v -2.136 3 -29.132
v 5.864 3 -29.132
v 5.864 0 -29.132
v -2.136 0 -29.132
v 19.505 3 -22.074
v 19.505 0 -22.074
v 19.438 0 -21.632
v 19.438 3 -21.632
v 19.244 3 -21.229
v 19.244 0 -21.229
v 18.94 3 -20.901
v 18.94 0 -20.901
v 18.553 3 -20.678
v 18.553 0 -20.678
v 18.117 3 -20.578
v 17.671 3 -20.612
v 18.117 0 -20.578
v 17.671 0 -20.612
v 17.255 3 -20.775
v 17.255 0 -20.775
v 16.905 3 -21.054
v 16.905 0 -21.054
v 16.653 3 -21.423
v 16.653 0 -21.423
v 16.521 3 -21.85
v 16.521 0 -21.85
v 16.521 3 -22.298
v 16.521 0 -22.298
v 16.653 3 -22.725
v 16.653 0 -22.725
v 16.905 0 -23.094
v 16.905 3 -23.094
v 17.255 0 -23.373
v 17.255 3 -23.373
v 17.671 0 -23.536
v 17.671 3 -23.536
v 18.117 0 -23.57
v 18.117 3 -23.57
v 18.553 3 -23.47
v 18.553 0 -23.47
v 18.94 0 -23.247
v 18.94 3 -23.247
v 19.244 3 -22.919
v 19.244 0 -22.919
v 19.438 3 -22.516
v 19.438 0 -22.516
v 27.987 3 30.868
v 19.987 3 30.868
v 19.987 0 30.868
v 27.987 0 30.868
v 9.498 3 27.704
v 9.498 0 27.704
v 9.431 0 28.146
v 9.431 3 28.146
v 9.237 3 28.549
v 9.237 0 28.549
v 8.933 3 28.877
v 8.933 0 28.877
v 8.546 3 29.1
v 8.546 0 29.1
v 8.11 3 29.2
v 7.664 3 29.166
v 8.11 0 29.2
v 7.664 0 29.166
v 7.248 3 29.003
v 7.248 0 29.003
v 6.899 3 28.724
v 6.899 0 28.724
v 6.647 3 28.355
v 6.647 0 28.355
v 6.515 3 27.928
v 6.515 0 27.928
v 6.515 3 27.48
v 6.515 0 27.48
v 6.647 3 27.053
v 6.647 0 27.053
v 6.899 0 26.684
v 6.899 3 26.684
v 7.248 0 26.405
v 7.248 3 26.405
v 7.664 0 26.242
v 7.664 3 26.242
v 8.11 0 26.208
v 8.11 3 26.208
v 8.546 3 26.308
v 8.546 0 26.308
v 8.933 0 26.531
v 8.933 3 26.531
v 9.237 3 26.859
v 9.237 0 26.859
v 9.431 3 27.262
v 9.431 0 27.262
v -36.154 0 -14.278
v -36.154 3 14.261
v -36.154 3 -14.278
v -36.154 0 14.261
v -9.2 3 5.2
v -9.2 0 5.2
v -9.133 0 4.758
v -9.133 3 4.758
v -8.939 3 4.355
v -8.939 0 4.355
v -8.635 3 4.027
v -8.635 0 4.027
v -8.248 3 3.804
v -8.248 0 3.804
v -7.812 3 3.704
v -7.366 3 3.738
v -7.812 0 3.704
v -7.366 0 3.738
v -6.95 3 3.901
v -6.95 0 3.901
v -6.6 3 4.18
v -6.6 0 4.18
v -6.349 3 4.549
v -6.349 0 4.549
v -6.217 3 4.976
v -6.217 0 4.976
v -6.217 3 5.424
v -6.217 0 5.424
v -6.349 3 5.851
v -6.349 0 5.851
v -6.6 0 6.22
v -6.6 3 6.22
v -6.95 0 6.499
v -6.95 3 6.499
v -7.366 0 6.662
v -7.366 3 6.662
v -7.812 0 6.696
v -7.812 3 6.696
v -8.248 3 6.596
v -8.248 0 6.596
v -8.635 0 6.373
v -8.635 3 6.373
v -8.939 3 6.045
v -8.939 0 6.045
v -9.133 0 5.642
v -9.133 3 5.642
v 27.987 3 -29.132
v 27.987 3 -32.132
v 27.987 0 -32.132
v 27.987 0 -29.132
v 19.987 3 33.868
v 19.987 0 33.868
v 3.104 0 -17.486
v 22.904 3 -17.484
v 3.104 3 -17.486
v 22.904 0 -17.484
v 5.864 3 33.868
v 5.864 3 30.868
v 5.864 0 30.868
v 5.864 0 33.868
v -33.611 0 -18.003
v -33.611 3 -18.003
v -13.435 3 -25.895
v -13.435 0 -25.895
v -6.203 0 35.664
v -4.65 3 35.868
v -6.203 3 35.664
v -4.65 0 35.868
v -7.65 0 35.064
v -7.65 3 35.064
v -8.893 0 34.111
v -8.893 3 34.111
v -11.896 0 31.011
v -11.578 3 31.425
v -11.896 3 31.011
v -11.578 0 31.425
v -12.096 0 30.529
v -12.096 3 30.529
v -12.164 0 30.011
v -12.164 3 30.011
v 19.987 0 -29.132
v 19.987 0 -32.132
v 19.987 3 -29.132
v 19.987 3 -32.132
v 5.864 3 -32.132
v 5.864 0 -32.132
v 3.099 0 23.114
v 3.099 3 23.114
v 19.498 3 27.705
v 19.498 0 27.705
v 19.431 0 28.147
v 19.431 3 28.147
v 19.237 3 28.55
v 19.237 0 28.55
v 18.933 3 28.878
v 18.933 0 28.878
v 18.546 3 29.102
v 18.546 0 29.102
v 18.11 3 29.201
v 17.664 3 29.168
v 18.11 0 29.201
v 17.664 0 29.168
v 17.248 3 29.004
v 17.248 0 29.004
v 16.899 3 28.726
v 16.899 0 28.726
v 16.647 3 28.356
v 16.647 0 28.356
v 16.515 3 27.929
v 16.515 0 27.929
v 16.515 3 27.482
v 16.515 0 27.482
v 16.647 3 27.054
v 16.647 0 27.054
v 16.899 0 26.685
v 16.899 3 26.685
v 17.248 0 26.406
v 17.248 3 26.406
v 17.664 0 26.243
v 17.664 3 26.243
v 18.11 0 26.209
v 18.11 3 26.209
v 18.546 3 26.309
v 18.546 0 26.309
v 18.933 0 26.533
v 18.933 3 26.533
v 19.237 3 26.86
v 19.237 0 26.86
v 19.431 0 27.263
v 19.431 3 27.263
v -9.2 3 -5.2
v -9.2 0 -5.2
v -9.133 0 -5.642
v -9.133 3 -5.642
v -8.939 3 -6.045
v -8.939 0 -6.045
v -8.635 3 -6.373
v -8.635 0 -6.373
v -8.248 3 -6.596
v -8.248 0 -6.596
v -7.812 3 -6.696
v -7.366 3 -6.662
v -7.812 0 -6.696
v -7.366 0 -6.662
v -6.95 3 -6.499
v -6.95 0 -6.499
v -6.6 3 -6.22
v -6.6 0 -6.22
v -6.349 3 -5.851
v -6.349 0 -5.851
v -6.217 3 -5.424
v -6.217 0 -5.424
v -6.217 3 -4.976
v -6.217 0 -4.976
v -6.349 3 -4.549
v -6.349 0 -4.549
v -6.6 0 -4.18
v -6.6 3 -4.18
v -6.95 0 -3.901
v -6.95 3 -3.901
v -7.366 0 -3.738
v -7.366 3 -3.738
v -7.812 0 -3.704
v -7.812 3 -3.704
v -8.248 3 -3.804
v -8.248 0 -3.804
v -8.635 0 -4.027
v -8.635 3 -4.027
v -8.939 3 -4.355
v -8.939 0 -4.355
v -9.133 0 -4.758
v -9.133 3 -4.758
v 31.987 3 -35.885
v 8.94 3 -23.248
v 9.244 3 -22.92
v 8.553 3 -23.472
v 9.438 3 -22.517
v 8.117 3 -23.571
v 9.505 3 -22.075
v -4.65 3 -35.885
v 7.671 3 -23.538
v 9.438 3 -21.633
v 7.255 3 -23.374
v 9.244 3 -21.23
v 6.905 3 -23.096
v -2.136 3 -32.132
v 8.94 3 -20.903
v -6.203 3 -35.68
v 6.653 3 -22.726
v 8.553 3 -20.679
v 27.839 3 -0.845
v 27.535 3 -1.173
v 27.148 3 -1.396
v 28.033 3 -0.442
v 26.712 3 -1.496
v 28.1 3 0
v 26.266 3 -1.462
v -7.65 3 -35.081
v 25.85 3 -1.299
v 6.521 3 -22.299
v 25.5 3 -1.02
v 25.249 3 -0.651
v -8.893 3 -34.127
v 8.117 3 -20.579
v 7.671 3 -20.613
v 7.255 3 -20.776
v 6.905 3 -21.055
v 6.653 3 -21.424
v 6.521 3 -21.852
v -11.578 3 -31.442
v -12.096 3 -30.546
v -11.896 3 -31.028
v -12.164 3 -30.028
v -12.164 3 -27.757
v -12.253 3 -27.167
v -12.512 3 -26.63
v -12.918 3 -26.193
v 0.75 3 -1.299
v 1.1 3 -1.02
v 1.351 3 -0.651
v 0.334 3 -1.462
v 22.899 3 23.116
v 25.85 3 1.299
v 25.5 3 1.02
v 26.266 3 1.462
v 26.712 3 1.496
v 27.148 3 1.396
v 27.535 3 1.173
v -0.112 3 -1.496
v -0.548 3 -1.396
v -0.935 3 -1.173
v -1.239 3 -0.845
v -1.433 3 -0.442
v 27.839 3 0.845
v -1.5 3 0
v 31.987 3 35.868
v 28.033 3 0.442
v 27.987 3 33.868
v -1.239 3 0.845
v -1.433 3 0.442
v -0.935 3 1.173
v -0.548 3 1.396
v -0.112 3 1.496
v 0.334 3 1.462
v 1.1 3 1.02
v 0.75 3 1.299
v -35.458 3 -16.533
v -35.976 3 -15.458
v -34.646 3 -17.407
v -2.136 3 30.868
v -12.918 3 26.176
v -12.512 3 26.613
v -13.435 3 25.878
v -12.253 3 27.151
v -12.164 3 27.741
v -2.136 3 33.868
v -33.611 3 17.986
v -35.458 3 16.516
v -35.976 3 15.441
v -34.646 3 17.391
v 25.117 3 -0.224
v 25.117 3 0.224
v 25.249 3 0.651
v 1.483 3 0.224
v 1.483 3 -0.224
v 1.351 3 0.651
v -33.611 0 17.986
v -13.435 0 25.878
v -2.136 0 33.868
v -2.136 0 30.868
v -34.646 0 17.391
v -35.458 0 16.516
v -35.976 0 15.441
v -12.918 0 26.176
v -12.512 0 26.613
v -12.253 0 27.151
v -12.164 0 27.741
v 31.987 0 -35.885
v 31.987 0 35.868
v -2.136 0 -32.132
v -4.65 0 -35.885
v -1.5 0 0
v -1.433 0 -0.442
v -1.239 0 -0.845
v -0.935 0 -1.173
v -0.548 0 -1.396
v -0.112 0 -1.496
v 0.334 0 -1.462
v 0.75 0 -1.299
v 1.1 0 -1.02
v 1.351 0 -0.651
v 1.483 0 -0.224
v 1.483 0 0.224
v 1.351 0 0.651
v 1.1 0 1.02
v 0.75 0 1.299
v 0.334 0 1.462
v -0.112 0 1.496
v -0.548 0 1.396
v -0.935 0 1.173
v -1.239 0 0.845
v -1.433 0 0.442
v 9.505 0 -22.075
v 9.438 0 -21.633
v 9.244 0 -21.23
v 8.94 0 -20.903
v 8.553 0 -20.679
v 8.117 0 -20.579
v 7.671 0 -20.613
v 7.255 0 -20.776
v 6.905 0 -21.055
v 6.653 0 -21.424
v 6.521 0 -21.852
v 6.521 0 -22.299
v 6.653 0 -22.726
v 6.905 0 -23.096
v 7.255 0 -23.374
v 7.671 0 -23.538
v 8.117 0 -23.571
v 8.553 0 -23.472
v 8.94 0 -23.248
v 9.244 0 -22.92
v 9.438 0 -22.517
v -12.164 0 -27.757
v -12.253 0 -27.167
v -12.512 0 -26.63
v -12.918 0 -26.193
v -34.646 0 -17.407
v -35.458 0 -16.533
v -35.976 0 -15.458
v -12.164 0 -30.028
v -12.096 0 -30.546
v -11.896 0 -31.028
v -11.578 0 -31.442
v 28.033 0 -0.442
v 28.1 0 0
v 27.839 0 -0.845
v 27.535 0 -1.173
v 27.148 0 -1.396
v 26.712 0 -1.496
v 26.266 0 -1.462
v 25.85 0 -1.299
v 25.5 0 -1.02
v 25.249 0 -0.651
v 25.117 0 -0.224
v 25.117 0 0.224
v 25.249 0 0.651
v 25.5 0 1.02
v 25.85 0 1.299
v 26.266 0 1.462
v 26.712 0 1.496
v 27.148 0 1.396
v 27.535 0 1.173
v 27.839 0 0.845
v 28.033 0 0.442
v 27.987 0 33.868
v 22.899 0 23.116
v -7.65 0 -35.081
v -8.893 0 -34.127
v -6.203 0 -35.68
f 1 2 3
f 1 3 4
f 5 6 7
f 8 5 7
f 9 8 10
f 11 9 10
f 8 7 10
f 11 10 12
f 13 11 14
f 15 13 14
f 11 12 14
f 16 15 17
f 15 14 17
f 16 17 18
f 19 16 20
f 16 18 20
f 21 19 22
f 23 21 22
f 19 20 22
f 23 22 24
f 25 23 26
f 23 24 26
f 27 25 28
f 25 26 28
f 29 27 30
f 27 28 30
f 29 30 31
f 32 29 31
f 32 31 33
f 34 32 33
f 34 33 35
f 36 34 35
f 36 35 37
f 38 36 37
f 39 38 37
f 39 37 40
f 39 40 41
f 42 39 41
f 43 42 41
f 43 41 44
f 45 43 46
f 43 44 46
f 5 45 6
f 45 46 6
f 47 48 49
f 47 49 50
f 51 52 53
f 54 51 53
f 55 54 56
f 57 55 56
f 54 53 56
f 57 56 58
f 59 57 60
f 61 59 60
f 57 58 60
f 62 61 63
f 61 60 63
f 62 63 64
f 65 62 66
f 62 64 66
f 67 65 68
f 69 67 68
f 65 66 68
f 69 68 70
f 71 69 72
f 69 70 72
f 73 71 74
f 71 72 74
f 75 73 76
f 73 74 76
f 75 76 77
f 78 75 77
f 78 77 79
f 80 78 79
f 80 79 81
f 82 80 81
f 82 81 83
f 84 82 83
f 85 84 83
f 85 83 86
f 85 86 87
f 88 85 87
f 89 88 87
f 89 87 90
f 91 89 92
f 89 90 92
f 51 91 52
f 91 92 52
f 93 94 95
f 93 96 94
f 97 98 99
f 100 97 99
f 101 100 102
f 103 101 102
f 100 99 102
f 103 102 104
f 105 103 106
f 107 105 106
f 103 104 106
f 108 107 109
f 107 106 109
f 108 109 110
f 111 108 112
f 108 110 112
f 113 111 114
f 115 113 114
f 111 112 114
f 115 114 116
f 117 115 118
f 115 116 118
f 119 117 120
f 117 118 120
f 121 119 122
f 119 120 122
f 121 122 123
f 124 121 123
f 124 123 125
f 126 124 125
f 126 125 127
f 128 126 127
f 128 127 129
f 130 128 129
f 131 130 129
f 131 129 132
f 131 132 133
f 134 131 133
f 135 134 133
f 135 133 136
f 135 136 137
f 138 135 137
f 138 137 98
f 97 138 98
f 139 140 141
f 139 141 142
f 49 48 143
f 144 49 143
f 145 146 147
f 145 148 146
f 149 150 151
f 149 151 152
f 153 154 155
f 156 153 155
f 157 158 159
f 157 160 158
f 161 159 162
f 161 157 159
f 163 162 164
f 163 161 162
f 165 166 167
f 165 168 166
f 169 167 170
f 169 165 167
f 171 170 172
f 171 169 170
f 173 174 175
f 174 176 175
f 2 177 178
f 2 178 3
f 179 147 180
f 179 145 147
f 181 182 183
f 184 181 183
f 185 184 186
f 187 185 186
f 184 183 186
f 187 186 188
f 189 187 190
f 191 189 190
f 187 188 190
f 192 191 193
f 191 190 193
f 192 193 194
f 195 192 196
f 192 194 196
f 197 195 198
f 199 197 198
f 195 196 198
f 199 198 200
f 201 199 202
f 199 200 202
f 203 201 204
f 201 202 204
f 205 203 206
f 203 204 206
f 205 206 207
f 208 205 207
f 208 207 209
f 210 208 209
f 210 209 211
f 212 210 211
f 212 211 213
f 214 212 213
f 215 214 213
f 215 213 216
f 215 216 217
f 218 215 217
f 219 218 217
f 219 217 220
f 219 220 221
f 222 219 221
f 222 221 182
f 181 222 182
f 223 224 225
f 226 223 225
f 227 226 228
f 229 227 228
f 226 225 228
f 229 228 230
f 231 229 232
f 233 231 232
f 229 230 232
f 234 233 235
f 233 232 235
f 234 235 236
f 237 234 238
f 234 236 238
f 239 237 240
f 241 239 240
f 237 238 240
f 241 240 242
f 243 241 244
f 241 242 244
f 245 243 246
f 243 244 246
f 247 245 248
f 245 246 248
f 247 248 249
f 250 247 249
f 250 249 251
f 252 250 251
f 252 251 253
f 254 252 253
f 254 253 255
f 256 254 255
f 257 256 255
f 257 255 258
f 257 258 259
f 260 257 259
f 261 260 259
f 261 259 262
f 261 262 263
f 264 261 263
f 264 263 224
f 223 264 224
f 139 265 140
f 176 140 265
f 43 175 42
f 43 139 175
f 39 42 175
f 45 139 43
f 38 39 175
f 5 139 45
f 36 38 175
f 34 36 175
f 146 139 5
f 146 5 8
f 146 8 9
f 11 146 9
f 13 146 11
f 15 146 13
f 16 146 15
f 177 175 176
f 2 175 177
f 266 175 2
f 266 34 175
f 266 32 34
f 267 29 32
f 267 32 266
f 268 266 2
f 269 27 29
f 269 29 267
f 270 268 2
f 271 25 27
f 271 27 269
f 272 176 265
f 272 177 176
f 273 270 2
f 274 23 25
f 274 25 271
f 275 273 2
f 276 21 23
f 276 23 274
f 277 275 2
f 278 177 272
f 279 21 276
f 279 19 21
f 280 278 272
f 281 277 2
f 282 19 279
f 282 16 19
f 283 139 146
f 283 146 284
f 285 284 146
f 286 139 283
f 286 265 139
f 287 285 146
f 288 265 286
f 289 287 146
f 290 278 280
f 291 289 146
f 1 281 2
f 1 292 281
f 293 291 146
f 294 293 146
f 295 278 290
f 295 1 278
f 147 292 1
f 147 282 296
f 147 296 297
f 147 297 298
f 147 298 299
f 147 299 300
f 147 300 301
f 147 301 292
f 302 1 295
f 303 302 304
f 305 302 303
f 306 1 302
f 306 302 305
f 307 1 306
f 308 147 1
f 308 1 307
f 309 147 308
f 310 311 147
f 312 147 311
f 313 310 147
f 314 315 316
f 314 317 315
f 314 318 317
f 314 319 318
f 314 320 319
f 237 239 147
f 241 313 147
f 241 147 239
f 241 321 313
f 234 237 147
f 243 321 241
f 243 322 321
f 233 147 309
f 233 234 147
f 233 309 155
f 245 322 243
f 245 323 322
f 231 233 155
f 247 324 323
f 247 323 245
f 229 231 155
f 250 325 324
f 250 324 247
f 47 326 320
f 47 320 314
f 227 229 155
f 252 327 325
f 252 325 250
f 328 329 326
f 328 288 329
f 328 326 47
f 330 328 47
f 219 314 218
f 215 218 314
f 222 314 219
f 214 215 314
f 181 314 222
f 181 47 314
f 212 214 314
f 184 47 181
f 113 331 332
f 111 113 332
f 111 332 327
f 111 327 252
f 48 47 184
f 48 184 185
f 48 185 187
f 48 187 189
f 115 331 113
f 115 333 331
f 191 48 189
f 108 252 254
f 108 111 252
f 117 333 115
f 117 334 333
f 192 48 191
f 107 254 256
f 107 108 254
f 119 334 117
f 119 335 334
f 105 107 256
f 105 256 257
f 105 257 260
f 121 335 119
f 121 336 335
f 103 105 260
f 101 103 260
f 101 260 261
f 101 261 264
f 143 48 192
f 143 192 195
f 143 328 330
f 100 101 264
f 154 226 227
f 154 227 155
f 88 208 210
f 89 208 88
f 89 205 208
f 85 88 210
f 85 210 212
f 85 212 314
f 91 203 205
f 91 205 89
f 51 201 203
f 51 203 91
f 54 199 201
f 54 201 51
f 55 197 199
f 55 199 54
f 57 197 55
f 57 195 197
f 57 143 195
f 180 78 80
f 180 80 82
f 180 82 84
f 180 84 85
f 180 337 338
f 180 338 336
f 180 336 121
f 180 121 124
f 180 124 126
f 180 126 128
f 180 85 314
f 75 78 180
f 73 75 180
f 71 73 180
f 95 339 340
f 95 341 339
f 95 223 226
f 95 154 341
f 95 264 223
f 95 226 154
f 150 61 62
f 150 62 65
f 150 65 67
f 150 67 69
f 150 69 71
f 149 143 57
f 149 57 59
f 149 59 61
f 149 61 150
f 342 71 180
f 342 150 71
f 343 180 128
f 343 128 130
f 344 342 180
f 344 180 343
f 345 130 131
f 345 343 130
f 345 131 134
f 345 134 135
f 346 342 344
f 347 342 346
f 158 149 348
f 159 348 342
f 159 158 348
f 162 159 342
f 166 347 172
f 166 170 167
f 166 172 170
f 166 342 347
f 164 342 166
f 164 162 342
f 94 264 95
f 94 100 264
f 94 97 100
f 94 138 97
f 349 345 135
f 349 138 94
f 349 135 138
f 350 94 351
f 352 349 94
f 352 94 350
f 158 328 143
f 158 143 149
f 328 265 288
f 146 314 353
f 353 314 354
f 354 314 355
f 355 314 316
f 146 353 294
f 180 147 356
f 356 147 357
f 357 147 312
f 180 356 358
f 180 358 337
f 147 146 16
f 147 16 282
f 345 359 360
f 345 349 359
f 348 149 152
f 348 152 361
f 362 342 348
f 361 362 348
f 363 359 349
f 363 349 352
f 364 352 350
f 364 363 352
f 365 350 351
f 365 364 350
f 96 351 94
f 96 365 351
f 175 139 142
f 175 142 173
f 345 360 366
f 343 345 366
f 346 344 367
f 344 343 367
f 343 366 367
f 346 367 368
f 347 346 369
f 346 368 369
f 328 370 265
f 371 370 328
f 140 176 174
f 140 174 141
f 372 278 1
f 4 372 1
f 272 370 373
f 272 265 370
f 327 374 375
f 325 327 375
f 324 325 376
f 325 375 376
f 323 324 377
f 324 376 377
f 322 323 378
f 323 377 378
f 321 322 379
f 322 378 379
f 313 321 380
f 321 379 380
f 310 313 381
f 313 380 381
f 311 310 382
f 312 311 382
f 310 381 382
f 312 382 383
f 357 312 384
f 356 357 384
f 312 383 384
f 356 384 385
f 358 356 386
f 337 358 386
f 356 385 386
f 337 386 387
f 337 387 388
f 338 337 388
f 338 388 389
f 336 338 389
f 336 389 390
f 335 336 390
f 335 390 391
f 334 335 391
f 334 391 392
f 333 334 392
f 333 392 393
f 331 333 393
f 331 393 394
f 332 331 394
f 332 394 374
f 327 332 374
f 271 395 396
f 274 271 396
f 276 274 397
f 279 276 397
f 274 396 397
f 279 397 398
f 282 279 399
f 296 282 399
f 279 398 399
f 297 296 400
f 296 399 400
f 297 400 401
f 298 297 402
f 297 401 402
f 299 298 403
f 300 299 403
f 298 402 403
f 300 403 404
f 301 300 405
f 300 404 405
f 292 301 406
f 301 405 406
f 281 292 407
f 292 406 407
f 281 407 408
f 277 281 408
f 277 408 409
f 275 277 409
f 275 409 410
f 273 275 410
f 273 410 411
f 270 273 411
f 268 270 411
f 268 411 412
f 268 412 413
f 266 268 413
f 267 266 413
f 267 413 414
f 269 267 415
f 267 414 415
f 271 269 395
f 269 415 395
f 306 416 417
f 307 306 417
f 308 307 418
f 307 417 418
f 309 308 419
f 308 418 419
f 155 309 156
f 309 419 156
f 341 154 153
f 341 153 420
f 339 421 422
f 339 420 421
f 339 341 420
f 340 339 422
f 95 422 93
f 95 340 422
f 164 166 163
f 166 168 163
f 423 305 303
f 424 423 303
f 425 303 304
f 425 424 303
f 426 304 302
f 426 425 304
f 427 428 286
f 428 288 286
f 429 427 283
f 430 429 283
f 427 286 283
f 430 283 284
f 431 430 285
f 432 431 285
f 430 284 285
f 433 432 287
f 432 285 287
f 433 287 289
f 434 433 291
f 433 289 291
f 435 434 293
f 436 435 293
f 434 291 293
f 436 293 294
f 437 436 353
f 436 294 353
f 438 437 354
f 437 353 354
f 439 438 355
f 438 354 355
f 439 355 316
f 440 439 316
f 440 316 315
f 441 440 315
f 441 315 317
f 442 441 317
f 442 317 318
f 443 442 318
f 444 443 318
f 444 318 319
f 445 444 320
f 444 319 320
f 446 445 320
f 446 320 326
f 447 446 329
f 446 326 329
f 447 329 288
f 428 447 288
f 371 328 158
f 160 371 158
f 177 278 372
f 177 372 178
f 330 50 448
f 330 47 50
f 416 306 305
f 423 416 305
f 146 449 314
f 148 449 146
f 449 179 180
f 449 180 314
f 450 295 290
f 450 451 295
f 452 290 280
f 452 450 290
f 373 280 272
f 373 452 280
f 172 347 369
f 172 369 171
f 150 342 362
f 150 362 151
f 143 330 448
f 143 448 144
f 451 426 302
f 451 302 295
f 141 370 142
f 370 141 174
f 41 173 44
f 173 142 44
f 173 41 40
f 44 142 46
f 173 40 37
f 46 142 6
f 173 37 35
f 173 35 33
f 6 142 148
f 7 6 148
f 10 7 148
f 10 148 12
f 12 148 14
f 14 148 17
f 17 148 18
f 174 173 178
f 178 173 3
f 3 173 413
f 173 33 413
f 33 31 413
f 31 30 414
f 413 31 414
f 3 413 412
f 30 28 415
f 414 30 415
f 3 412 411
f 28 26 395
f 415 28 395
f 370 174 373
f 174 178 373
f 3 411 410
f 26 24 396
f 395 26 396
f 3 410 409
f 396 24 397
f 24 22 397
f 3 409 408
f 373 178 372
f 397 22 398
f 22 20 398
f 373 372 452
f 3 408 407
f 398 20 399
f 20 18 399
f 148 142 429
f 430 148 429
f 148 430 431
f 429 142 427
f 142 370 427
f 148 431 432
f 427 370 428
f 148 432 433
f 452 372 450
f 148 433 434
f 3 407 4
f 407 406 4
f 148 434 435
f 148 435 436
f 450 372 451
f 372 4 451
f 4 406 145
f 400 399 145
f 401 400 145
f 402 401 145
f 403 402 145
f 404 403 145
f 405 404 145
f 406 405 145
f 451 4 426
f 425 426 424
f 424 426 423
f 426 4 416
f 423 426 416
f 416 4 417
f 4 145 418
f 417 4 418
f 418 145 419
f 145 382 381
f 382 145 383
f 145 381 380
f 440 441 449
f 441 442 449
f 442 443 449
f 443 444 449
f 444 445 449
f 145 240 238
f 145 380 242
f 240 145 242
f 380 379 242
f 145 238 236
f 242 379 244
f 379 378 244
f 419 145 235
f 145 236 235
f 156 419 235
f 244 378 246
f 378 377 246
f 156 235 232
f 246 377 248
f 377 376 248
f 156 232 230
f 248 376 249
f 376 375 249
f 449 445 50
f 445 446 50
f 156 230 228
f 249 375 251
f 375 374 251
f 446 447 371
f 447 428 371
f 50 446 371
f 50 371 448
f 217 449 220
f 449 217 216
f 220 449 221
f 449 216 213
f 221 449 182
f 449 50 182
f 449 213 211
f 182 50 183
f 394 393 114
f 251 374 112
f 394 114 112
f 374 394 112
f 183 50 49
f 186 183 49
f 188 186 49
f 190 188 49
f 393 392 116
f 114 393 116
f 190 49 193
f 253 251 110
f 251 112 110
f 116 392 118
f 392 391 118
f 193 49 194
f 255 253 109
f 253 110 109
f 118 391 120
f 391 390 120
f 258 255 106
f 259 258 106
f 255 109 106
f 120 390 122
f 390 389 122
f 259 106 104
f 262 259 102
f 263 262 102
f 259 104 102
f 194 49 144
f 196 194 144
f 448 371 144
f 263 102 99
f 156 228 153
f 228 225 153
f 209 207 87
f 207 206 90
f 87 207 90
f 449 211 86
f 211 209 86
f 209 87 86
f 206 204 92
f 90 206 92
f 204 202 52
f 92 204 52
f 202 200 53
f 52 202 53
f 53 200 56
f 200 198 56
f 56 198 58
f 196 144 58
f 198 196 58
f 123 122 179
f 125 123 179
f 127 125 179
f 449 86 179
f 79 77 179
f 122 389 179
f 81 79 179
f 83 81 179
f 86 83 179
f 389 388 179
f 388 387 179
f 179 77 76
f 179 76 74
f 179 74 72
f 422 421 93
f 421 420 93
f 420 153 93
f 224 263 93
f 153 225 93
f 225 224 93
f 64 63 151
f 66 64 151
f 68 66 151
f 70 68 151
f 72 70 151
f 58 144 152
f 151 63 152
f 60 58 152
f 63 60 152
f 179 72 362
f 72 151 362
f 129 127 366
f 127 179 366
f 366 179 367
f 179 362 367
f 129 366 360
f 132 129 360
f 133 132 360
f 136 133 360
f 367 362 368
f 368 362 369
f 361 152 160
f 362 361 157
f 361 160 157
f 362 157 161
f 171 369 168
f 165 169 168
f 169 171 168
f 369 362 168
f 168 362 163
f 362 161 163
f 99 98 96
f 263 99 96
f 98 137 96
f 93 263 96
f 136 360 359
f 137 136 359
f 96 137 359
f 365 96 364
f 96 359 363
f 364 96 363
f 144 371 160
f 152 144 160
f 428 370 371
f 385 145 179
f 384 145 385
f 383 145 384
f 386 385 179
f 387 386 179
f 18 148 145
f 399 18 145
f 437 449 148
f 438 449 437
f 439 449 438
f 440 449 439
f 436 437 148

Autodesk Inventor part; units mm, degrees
ref_plane "YZ Plane" through (0, 0, 0) normal (1, 0, 0) x (0, 1, 0)
ref_plane "XZ Plane" through (0, 0, 0) normal (0, 1, 0) x (-1, 0, 0)
ref_plane "XY Plane" through (0, 0, 0) normal (0, 0, 1) x (1, 0, 0)
sketch "Sketch1" plane through (0, 0, 0) normal (0, 1, 0) x (-1, 0, 0)
  circle A0 centre (7.7, 5.2) radius 1.5
  circle A1 centre (7.7, -5.2) radius 1.5
  circle A2 centre (0, 0) radius 1.5
  line L0 (37.8003, -0.0084) -> (-30.1744, -0.0084) construction
  line L1 (-27.0022, -36.8848) -> (-27.0022, -0.0084)
  line L2 (12.164, -30.8563) -> (6.1355, -36.8848)
  line L3 (-27.0022, -36.8848) -> (6.1355, -36.8848)
  line L4 (36.1543, -0.0084) -> (36.1543, -17.0084)
  line L5 (36.1543, -17.0084) -> (12.164, -30.8563)
  line L6 (-27.0022, 36.8681) -> (-27.0022, -0.0084)
  line L7 (12.164, 30.8396) -> (6.1355, 36.8681)
  line L8 (-27.0022, 36.8681) -> (6.1355, 36.8681)
  line L9 (36.1543, -0.0084) -> (36.1543, 16.9916)
  line L10 (36.1543, 16.9916) -> (12.164, 30.8396)
extrude "Extrusion1" add sketch "Sketch1" along normal blind 3
sketch "Sketch2" plane through (0, 3, 0) normal (0, 1, 0) x (1, 0, 0)
  circle A0 centre (13, 13.115) radius 3.5
  point P0 (0, 0)
  dimension "d2" = 7
  dimension "d3" = 13.115
  dimension "d4" = 13
extrude "Extrusion2" cut sketch "Sketch2" against normal through all
move faces "Move1" translate (0.9995, 0, 0) faces at (27.0022, 1, -12.3005)
sketch "Sketch5" plane through (0, 0, 0) normal (0, -1, 0) x (1, 0, 0)
  circle A0 centre (18.0046, -22.074) radius 1.5
  circle A1 centre (8.0046, -22.0753) radius 1.5
  circle A2 centre (17.9981, 27.7053) radius 1.5
  circle A3 centre (7.9981, 27.704) radius 1.5
  line L0 (22.8987, 23.1163) -> (22.904, -17.4837)
  line L1 (22.904, -17.4837) -> (3.104, -17.4863)
  line L2 (3.0987, 23.1137) -> (22.8987, 23.1163)
  line L3 (3.104, -17.4863) -> (3.0987, 23.1137)
  point P0 (0, 0)
extrude "Extrusion4" cut sketch "Sketch5" against normal through all
sketch "Sketch6" plane through (0, 3, 0) normal (0, 1, 0) x (1, 0, 0)
  circle A0 centre (0, 0) radius 1.5
  circle A1 centre (26.6, 0) radius 1.5
  dimension "d22" = 3
  dimension "d23" = 26.6
move faces "Move2" translate (3.9857, 0, 0) faces at (28.0017, 1, -12.3005)
extrude "Extrusion5" cut sketch "Sketch6" against normal through all
sketch "Sketch7" plane through (0, 3, 0) normal (0, 1, 0) x (1, 0, 0)
  line L0 (27.9874, -33.8681) -> (19.9874, -33.8681)
  line L1 (19.9874, -30.8681) -> (19.9874, -33.8681)
  line L2 (27.9874, -30.8681) -> (27.9874, -33.8681)
  line L3 (19.9874, -30.8681) -> (27.9874, -30.8681)
  line L4 (5.8645, -33.8681) -> (-2.1355, -33.8681)
  line L5 (-2.1355, -30.8681) -> (-2.1355, -33.8681)
  line L6 (-2.1355, -30.8681) -> (5.8645, -30.8681)
  line L7 (5.8645, -30.8681) -> (5.8645, -33.8681)
  line L8 (-2.1355, 32.1319) -> (5.8645, 32.1319)
  line L9 (5.8645, 29.1319) -> (-2.1355, 29.1319)
  line L10 (5.8645, 32.1319) -> (5.8645, 29.1319)
  line L11 (-2.1355, 32.1319) -> (-2.1355, 29.1319)
  line L12 (19.9874, 32.1319) -> (19.9874, 29.1319)
  line L13 (27.9874, 32.1319) -> (27.9874, 29.1319)
  line L14 (27.9874, 29.1319) -> (19.9874, 29.1319)
  line L15 (19.9874, 32.1319) -> (27.9874, 32.1319)
  point P0 (0, 0)
  point P1 (31.9874, -36.8681)
extrude "Extrusion6" cut sketch "Sketch7" against normal through all
sketch "Sketch8" plane through (0, 3, 0) normal (0, 1, 0) x (1, 0, 0)
  line L0 (5.8645, -33.8681) -> (-2.1355, -33.8681) projected
  line L1 (-2.1355, -35.8681) -> (-2.1355, -36.8681) construction
  line L2 (-2.1355, 32.1319) -> (5.8645, 32.1319) construction
  line L3 (31.9874, 35.8848) -> (-7.1355, 35.8848)
  line L4 (31.9874, -35.8681) -> (-7.1355, -35.8681)
  line L5 (31.9874, -36.8681) -> (31.9874, -35.8681)
  line L6 (31.9874, 35.8848) -> (31.9874, 36.8848)
  line L7 (-6.1355, 36.8848) -> (-7.1355, 35.8848)
  line L8 (-6.1355, -36.8681) -> (-7.1355, -35.8681)
  line L9 (-6.1355, -36.8681) -> (31.9874, -36.8681)
  line L10 (-6.1355, 36.8848) -> (31.9874, 36.8848)
  point P0 (0, 0)
  dimension "d32" = 2
extrude "Extrusion7" cut sketch "Sketch8" against normal through all
sketch "Sketch9" plane through (0, 3, 0) normal (0, 1, 0) x (1, 0, 0)
  line L0 (-12.164, 30.8563) -> (-12.164, 14.1606) construction
  line L1 (-12.164, 26.3921) -> (-12.164, 30.8563)
  line L2 (-36.1543, 17.0084) -> (-12.164, 30.8563) projected
  line L3 (-36.1543, 17.0084) -> (-12.164, 30.8563)
  line L4 (-36.1543, 17.0084) -> (-12.164, 26.3921)
  line L5 (-41.6853, 0) -> (0, 0) construction
  line L6 (-12.164, -30.8396) -> (-12.164, -14.1438) construction
  line L7 (-12.164, -26.3753) -> (-12.164, -30.8396)
  line L8 (-36.1543, -16.9916) -> (-12.164, -30.8396)
  line L9 (-36.1543, -16.9916) -> (-12.164, -26.3753)
extrude "Extrusion8" cut sketch "Sketch9" against normal up to next
fillet "Fillet1" radius 6 2 edges at (-7.1355, 1.5, -35.8848) (-7.1355, 1.5, 35.8681)
fillet "Fillet2" radius 2 4 edges at (-12.164, 1.5, -26.3921) (-12.164, 1.5, 26.3753) (-12.164, 1.5, 30.8396) (-12.164, 1.5, -30.8563)
fillet "Fillet3" radius 4 2 edges at (-36.1543, 1.5, 16.9916) (-36.1543, 1.5, -17.0084)
properties part number "Dock bot2" material "Acrylic"
